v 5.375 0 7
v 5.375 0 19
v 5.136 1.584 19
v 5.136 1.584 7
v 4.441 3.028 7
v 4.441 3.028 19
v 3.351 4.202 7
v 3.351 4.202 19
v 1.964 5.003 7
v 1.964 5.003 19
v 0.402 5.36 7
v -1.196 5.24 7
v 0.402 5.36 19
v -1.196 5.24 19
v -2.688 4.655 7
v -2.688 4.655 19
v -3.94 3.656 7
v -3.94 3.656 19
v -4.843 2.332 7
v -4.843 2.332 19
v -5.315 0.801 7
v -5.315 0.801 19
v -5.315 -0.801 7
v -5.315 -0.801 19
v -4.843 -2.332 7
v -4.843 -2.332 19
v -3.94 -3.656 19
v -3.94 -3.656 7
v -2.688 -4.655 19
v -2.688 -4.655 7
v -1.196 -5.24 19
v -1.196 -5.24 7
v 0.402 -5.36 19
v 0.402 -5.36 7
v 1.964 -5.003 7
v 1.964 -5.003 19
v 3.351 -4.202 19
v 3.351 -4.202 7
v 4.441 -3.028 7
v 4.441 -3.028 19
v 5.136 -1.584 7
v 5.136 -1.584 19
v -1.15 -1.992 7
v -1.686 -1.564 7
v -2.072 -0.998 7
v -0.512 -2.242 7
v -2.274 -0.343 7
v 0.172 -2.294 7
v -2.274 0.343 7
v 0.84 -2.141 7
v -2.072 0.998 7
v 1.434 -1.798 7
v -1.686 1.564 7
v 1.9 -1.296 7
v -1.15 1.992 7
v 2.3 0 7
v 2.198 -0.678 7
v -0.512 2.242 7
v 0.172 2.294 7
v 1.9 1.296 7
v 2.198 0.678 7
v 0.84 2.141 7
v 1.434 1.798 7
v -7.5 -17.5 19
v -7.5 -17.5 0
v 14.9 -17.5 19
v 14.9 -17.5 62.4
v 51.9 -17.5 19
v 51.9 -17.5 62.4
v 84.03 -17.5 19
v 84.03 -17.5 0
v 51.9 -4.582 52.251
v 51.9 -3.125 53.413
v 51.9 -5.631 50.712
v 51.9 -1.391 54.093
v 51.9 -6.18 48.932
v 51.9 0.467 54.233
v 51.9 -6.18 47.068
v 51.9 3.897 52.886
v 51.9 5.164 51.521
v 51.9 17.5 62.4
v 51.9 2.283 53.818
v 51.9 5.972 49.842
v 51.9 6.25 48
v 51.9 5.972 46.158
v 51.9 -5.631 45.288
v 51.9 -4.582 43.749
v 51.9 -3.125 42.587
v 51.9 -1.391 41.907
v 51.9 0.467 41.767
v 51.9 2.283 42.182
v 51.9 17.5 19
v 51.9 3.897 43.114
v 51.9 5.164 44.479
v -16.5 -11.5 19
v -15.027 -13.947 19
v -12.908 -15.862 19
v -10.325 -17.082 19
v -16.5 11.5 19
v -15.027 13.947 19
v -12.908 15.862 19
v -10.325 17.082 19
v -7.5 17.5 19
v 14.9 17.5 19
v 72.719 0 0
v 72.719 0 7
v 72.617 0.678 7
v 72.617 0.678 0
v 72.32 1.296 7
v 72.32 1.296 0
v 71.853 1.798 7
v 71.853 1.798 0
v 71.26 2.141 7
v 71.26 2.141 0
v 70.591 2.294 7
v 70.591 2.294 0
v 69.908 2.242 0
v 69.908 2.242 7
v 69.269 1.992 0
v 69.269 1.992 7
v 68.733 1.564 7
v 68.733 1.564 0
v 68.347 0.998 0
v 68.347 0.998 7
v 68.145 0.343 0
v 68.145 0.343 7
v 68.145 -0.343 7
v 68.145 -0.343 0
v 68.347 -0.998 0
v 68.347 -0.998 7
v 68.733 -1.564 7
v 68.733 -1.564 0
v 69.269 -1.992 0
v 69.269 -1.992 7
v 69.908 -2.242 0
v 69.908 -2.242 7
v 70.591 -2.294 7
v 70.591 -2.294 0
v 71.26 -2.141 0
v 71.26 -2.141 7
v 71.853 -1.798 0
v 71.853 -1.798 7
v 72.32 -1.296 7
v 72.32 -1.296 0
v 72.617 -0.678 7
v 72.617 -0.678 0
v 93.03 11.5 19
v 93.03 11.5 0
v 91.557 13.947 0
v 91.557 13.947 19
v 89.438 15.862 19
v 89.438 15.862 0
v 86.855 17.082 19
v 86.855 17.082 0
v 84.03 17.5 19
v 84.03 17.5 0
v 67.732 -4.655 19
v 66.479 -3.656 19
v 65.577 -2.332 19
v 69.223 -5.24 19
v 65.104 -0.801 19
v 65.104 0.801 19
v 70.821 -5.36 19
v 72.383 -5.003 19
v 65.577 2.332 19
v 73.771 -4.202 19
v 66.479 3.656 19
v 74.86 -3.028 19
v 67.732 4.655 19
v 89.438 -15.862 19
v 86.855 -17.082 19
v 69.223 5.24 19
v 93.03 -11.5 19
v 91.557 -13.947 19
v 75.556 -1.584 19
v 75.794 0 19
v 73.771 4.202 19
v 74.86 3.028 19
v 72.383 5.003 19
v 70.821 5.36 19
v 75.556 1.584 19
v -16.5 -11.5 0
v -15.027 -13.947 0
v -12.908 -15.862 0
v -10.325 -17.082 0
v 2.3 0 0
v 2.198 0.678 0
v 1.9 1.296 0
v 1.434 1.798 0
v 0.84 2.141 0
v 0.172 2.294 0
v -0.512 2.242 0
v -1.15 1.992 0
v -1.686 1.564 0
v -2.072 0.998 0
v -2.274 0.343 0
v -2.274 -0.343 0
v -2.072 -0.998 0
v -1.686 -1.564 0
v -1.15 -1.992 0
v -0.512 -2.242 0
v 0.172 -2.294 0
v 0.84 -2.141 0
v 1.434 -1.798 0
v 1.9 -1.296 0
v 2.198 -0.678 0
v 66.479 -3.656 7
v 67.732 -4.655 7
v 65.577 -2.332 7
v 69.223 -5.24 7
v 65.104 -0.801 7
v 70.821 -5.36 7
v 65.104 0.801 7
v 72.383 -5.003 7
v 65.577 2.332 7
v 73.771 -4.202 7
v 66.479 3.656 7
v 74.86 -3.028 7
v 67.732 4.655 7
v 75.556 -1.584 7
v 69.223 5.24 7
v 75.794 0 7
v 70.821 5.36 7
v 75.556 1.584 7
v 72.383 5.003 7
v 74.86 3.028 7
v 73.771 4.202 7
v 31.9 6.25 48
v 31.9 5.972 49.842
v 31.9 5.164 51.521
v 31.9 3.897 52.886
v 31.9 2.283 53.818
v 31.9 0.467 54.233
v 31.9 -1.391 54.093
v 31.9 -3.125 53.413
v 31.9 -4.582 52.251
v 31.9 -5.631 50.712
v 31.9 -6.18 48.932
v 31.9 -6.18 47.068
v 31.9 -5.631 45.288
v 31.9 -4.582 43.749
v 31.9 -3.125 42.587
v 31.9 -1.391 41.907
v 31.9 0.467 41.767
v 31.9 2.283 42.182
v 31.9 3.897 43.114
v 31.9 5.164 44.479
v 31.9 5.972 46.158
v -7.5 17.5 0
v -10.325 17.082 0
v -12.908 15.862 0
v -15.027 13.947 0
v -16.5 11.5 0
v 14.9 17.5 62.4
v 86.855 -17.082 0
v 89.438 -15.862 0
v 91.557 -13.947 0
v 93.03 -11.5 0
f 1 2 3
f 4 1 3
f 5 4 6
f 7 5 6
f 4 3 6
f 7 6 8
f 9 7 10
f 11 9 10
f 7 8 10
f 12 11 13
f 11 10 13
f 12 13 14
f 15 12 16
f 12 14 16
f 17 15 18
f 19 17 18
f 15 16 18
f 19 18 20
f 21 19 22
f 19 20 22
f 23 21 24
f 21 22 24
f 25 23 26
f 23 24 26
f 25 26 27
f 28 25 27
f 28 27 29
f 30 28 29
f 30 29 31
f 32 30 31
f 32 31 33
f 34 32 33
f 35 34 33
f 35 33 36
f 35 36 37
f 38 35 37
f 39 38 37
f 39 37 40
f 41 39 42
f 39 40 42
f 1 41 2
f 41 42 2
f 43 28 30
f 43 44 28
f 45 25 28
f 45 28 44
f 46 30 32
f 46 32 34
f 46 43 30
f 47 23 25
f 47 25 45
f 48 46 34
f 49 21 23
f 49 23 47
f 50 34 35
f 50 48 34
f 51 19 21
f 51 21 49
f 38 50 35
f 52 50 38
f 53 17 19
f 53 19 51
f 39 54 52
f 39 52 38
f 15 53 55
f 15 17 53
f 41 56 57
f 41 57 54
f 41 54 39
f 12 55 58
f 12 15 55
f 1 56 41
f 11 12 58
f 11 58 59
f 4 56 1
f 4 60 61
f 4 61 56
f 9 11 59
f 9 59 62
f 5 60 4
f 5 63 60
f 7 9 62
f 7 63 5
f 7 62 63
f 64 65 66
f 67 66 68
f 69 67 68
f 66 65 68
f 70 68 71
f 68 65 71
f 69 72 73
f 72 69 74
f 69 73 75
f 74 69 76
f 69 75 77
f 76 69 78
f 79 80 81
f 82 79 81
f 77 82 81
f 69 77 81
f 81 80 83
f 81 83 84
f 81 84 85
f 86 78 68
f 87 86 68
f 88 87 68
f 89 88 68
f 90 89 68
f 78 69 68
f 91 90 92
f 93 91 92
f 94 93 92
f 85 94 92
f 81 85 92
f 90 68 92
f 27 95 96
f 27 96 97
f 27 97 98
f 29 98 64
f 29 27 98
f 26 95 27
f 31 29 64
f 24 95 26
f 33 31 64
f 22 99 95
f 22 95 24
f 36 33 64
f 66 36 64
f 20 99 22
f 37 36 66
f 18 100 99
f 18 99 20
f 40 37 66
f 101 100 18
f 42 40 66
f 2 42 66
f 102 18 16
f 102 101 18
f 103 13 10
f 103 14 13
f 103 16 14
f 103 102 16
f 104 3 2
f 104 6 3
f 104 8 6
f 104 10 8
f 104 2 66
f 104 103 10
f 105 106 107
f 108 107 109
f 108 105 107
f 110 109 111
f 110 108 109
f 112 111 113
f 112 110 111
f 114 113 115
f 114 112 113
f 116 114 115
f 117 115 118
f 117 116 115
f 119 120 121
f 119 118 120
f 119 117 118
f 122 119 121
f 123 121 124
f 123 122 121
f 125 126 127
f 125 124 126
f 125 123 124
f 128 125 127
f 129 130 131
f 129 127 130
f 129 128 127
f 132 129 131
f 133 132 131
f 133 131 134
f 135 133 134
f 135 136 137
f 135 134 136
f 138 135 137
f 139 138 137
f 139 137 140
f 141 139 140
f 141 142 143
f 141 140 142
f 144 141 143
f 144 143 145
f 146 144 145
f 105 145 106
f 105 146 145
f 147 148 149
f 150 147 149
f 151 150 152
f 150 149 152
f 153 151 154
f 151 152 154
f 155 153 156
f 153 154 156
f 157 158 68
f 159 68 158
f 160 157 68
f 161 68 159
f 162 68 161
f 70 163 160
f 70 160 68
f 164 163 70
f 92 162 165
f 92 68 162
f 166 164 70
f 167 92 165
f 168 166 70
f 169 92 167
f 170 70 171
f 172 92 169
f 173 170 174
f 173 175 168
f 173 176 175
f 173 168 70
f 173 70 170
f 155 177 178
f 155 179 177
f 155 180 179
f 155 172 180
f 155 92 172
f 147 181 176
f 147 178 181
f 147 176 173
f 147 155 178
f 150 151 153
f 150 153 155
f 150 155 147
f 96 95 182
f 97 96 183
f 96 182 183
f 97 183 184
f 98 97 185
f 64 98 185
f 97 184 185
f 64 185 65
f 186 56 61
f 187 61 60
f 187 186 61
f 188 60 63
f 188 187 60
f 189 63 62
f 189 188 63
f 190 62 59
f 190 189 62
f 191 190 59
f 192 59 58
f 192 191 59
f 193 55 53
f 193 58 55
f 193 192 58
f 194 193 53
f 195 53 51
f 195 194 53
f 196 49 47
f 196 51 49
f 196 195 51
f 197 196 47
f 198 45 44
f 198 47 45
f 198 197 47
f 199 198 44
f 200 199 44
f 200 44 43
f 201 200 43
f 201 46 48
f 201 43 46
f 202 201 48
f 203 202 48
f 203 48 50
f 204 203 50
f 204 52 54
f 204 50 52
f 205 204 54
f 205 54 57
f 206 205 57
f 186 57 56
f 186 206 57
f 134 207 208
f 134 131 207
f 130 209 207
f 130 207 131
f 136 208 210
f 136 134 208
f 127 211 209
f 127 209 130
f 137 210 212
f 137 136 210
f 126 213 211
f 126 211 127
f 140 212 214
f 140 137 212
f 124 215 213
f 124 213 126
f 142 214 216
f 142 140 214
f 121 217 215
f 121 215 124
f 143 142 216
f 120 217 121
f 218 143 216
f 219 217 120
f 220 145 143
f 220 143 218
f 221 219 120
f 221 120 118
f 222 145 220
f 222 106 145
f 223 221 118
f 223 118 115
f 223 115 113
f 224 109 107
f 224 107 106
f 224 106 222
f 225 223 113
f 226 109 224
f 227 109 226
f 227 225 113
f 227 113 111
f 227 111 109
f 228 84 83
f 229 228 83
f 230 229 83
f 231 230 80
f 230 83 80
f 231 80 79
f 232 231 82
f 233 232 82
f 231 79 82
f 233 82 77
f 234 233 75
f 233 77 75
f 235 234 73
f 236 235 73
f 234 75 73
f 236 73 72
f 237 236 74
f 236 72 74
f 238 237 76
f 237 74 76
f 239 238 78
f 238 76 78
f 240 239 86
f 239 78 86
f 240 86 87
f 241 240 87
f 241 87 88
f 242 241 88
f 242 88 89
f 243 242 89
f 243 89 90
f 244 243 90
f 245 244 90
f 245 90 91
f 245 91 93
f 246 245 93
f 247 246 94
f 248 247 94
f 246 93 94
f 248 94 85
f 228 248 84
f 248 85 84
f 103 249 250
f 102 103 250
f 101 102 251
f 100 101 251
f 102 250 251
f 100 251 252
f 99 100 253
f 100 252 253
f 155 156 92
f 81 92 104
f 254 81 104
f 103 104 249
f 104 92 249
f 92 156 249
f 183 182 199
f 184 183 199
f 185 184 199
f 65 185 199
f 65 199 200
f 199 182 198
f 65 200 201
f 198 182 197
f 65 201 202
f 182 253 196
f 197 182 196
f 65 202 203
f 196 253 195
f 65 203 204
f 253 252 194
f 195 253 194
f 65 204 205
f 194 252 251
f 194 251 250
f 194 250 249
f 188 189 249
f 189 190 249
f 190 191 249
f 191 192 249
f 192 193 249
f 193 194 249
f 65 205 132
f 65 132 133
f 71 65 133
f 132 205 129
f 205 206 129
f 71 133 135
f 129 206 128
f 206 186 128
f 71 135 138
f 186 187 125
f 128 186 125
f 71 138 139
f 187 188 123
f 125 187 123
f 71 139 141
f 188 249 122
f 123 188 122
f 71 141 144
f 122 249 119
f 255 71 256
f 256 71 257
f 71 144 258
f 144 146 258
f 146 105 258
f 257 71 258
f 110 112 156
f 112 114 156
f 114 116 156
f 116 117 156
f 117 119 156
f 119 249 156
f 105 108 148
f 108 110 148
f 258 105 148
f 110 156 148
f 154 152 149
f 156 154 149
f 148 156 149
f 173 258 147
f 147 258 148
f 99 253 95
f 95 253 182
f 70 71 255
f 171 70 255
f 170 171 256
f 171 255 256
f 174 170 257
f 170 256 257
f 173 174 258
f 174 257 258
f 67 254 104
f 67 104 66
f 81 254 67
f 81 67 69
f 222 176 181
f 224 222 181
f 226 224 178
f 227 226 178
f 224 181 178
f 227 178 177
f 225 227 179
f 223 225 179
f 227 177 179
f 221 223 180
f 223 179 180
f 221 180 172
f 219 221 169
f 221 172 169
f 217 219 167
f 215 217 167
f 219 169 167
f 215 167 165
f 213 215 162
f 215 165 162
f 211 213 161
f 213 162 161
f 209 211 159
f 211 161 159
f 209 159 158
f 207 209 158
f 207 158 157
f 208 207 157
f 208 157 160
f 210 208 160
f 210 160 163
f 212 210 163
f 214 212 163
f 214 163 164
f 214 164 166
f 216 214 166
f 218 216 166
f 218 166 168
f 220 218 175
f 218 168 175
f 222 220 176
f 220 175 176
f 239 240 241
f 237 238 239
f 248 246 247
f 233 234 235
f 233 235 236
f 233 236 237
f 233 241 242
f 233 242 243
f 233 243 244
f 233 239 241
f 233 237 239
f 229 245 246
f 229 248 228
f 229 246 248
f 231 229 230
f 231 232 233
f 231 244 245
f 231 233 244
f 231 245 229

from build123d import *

# Parameters (mm, degrees)
F0_R     = 2.3
F1_DEPTH = 19
F3_DEPTH = 43.4
F5_R     = 6.25
F6_DEPTH = 20
F7_R     = 5.375
F8_DEPTH = 12


with BuildPart() as f1:
    # F0 (on Top) → F1 (new body)
    with BuildSketch(Plane.XY):
        with BuildLine():
            Line((84.03, 17.5), (-7.5, 17.5))
            ThreePointArc((-7.5, 17.5), (-12.908327, 15.86249), (-16.5, 11.5))
            Line((-16.5, 11.5), (-16.5, -11.5))
            ThreePointArc((-16.5, -11.5), (-12.908327, -15.86249), (-7.5, -17.5))
            Line((-7.5, -17.5), (84.03, -17.5))
            ThreePointArc((84.03, -17.5), (89.438327, -15.86249), (93.03, -11.5))
            Line((93.03, -11.5), (93.03, 11.5))
            ThreePointArc((93.03, 11.5), (89.438327, 15.86249), (84.03, 17.5))
        make_face()
        Circle(F0_R, mode=Mode.SUBTRACT)
        with Locations((70.419462, 0)):
            Circle(F0_R, mode=Mode.SUBTRACT)
    extrude(amount=F1_DEPTH)

    # F2 (on face) → F3 (join)
    with BuildSketch(Plane.XY.offset(19)):
        Polygon((14.9, 17.5), (14.9, 0), (14.9, -17.5), (51.9, -17.5), (51.9, 0), (51.9, 17.5), align=None)
    extrude(amount=F3_DEPTH)

    # F5 (on face) → F6 (cut)
    with BuildSketch(Plane.YZ.offset(51.9)):
        with Locations((0, 48)):
            Circle(F5_R)
    extrude(amount=-F6_DEPTH, mode=Mode.SUBTRACT)

    # F7 (on face) → F8 (cut)
    with BuildSketch(Plane.XY.offset(19)):
        Circle(F7_R)
        with Locations((70.419462, 0)):
            Circle(F7_R)
    extrude(amount=-F8_DEPTH, mode=Mode.SUBTRACT)


solid = f1.part
